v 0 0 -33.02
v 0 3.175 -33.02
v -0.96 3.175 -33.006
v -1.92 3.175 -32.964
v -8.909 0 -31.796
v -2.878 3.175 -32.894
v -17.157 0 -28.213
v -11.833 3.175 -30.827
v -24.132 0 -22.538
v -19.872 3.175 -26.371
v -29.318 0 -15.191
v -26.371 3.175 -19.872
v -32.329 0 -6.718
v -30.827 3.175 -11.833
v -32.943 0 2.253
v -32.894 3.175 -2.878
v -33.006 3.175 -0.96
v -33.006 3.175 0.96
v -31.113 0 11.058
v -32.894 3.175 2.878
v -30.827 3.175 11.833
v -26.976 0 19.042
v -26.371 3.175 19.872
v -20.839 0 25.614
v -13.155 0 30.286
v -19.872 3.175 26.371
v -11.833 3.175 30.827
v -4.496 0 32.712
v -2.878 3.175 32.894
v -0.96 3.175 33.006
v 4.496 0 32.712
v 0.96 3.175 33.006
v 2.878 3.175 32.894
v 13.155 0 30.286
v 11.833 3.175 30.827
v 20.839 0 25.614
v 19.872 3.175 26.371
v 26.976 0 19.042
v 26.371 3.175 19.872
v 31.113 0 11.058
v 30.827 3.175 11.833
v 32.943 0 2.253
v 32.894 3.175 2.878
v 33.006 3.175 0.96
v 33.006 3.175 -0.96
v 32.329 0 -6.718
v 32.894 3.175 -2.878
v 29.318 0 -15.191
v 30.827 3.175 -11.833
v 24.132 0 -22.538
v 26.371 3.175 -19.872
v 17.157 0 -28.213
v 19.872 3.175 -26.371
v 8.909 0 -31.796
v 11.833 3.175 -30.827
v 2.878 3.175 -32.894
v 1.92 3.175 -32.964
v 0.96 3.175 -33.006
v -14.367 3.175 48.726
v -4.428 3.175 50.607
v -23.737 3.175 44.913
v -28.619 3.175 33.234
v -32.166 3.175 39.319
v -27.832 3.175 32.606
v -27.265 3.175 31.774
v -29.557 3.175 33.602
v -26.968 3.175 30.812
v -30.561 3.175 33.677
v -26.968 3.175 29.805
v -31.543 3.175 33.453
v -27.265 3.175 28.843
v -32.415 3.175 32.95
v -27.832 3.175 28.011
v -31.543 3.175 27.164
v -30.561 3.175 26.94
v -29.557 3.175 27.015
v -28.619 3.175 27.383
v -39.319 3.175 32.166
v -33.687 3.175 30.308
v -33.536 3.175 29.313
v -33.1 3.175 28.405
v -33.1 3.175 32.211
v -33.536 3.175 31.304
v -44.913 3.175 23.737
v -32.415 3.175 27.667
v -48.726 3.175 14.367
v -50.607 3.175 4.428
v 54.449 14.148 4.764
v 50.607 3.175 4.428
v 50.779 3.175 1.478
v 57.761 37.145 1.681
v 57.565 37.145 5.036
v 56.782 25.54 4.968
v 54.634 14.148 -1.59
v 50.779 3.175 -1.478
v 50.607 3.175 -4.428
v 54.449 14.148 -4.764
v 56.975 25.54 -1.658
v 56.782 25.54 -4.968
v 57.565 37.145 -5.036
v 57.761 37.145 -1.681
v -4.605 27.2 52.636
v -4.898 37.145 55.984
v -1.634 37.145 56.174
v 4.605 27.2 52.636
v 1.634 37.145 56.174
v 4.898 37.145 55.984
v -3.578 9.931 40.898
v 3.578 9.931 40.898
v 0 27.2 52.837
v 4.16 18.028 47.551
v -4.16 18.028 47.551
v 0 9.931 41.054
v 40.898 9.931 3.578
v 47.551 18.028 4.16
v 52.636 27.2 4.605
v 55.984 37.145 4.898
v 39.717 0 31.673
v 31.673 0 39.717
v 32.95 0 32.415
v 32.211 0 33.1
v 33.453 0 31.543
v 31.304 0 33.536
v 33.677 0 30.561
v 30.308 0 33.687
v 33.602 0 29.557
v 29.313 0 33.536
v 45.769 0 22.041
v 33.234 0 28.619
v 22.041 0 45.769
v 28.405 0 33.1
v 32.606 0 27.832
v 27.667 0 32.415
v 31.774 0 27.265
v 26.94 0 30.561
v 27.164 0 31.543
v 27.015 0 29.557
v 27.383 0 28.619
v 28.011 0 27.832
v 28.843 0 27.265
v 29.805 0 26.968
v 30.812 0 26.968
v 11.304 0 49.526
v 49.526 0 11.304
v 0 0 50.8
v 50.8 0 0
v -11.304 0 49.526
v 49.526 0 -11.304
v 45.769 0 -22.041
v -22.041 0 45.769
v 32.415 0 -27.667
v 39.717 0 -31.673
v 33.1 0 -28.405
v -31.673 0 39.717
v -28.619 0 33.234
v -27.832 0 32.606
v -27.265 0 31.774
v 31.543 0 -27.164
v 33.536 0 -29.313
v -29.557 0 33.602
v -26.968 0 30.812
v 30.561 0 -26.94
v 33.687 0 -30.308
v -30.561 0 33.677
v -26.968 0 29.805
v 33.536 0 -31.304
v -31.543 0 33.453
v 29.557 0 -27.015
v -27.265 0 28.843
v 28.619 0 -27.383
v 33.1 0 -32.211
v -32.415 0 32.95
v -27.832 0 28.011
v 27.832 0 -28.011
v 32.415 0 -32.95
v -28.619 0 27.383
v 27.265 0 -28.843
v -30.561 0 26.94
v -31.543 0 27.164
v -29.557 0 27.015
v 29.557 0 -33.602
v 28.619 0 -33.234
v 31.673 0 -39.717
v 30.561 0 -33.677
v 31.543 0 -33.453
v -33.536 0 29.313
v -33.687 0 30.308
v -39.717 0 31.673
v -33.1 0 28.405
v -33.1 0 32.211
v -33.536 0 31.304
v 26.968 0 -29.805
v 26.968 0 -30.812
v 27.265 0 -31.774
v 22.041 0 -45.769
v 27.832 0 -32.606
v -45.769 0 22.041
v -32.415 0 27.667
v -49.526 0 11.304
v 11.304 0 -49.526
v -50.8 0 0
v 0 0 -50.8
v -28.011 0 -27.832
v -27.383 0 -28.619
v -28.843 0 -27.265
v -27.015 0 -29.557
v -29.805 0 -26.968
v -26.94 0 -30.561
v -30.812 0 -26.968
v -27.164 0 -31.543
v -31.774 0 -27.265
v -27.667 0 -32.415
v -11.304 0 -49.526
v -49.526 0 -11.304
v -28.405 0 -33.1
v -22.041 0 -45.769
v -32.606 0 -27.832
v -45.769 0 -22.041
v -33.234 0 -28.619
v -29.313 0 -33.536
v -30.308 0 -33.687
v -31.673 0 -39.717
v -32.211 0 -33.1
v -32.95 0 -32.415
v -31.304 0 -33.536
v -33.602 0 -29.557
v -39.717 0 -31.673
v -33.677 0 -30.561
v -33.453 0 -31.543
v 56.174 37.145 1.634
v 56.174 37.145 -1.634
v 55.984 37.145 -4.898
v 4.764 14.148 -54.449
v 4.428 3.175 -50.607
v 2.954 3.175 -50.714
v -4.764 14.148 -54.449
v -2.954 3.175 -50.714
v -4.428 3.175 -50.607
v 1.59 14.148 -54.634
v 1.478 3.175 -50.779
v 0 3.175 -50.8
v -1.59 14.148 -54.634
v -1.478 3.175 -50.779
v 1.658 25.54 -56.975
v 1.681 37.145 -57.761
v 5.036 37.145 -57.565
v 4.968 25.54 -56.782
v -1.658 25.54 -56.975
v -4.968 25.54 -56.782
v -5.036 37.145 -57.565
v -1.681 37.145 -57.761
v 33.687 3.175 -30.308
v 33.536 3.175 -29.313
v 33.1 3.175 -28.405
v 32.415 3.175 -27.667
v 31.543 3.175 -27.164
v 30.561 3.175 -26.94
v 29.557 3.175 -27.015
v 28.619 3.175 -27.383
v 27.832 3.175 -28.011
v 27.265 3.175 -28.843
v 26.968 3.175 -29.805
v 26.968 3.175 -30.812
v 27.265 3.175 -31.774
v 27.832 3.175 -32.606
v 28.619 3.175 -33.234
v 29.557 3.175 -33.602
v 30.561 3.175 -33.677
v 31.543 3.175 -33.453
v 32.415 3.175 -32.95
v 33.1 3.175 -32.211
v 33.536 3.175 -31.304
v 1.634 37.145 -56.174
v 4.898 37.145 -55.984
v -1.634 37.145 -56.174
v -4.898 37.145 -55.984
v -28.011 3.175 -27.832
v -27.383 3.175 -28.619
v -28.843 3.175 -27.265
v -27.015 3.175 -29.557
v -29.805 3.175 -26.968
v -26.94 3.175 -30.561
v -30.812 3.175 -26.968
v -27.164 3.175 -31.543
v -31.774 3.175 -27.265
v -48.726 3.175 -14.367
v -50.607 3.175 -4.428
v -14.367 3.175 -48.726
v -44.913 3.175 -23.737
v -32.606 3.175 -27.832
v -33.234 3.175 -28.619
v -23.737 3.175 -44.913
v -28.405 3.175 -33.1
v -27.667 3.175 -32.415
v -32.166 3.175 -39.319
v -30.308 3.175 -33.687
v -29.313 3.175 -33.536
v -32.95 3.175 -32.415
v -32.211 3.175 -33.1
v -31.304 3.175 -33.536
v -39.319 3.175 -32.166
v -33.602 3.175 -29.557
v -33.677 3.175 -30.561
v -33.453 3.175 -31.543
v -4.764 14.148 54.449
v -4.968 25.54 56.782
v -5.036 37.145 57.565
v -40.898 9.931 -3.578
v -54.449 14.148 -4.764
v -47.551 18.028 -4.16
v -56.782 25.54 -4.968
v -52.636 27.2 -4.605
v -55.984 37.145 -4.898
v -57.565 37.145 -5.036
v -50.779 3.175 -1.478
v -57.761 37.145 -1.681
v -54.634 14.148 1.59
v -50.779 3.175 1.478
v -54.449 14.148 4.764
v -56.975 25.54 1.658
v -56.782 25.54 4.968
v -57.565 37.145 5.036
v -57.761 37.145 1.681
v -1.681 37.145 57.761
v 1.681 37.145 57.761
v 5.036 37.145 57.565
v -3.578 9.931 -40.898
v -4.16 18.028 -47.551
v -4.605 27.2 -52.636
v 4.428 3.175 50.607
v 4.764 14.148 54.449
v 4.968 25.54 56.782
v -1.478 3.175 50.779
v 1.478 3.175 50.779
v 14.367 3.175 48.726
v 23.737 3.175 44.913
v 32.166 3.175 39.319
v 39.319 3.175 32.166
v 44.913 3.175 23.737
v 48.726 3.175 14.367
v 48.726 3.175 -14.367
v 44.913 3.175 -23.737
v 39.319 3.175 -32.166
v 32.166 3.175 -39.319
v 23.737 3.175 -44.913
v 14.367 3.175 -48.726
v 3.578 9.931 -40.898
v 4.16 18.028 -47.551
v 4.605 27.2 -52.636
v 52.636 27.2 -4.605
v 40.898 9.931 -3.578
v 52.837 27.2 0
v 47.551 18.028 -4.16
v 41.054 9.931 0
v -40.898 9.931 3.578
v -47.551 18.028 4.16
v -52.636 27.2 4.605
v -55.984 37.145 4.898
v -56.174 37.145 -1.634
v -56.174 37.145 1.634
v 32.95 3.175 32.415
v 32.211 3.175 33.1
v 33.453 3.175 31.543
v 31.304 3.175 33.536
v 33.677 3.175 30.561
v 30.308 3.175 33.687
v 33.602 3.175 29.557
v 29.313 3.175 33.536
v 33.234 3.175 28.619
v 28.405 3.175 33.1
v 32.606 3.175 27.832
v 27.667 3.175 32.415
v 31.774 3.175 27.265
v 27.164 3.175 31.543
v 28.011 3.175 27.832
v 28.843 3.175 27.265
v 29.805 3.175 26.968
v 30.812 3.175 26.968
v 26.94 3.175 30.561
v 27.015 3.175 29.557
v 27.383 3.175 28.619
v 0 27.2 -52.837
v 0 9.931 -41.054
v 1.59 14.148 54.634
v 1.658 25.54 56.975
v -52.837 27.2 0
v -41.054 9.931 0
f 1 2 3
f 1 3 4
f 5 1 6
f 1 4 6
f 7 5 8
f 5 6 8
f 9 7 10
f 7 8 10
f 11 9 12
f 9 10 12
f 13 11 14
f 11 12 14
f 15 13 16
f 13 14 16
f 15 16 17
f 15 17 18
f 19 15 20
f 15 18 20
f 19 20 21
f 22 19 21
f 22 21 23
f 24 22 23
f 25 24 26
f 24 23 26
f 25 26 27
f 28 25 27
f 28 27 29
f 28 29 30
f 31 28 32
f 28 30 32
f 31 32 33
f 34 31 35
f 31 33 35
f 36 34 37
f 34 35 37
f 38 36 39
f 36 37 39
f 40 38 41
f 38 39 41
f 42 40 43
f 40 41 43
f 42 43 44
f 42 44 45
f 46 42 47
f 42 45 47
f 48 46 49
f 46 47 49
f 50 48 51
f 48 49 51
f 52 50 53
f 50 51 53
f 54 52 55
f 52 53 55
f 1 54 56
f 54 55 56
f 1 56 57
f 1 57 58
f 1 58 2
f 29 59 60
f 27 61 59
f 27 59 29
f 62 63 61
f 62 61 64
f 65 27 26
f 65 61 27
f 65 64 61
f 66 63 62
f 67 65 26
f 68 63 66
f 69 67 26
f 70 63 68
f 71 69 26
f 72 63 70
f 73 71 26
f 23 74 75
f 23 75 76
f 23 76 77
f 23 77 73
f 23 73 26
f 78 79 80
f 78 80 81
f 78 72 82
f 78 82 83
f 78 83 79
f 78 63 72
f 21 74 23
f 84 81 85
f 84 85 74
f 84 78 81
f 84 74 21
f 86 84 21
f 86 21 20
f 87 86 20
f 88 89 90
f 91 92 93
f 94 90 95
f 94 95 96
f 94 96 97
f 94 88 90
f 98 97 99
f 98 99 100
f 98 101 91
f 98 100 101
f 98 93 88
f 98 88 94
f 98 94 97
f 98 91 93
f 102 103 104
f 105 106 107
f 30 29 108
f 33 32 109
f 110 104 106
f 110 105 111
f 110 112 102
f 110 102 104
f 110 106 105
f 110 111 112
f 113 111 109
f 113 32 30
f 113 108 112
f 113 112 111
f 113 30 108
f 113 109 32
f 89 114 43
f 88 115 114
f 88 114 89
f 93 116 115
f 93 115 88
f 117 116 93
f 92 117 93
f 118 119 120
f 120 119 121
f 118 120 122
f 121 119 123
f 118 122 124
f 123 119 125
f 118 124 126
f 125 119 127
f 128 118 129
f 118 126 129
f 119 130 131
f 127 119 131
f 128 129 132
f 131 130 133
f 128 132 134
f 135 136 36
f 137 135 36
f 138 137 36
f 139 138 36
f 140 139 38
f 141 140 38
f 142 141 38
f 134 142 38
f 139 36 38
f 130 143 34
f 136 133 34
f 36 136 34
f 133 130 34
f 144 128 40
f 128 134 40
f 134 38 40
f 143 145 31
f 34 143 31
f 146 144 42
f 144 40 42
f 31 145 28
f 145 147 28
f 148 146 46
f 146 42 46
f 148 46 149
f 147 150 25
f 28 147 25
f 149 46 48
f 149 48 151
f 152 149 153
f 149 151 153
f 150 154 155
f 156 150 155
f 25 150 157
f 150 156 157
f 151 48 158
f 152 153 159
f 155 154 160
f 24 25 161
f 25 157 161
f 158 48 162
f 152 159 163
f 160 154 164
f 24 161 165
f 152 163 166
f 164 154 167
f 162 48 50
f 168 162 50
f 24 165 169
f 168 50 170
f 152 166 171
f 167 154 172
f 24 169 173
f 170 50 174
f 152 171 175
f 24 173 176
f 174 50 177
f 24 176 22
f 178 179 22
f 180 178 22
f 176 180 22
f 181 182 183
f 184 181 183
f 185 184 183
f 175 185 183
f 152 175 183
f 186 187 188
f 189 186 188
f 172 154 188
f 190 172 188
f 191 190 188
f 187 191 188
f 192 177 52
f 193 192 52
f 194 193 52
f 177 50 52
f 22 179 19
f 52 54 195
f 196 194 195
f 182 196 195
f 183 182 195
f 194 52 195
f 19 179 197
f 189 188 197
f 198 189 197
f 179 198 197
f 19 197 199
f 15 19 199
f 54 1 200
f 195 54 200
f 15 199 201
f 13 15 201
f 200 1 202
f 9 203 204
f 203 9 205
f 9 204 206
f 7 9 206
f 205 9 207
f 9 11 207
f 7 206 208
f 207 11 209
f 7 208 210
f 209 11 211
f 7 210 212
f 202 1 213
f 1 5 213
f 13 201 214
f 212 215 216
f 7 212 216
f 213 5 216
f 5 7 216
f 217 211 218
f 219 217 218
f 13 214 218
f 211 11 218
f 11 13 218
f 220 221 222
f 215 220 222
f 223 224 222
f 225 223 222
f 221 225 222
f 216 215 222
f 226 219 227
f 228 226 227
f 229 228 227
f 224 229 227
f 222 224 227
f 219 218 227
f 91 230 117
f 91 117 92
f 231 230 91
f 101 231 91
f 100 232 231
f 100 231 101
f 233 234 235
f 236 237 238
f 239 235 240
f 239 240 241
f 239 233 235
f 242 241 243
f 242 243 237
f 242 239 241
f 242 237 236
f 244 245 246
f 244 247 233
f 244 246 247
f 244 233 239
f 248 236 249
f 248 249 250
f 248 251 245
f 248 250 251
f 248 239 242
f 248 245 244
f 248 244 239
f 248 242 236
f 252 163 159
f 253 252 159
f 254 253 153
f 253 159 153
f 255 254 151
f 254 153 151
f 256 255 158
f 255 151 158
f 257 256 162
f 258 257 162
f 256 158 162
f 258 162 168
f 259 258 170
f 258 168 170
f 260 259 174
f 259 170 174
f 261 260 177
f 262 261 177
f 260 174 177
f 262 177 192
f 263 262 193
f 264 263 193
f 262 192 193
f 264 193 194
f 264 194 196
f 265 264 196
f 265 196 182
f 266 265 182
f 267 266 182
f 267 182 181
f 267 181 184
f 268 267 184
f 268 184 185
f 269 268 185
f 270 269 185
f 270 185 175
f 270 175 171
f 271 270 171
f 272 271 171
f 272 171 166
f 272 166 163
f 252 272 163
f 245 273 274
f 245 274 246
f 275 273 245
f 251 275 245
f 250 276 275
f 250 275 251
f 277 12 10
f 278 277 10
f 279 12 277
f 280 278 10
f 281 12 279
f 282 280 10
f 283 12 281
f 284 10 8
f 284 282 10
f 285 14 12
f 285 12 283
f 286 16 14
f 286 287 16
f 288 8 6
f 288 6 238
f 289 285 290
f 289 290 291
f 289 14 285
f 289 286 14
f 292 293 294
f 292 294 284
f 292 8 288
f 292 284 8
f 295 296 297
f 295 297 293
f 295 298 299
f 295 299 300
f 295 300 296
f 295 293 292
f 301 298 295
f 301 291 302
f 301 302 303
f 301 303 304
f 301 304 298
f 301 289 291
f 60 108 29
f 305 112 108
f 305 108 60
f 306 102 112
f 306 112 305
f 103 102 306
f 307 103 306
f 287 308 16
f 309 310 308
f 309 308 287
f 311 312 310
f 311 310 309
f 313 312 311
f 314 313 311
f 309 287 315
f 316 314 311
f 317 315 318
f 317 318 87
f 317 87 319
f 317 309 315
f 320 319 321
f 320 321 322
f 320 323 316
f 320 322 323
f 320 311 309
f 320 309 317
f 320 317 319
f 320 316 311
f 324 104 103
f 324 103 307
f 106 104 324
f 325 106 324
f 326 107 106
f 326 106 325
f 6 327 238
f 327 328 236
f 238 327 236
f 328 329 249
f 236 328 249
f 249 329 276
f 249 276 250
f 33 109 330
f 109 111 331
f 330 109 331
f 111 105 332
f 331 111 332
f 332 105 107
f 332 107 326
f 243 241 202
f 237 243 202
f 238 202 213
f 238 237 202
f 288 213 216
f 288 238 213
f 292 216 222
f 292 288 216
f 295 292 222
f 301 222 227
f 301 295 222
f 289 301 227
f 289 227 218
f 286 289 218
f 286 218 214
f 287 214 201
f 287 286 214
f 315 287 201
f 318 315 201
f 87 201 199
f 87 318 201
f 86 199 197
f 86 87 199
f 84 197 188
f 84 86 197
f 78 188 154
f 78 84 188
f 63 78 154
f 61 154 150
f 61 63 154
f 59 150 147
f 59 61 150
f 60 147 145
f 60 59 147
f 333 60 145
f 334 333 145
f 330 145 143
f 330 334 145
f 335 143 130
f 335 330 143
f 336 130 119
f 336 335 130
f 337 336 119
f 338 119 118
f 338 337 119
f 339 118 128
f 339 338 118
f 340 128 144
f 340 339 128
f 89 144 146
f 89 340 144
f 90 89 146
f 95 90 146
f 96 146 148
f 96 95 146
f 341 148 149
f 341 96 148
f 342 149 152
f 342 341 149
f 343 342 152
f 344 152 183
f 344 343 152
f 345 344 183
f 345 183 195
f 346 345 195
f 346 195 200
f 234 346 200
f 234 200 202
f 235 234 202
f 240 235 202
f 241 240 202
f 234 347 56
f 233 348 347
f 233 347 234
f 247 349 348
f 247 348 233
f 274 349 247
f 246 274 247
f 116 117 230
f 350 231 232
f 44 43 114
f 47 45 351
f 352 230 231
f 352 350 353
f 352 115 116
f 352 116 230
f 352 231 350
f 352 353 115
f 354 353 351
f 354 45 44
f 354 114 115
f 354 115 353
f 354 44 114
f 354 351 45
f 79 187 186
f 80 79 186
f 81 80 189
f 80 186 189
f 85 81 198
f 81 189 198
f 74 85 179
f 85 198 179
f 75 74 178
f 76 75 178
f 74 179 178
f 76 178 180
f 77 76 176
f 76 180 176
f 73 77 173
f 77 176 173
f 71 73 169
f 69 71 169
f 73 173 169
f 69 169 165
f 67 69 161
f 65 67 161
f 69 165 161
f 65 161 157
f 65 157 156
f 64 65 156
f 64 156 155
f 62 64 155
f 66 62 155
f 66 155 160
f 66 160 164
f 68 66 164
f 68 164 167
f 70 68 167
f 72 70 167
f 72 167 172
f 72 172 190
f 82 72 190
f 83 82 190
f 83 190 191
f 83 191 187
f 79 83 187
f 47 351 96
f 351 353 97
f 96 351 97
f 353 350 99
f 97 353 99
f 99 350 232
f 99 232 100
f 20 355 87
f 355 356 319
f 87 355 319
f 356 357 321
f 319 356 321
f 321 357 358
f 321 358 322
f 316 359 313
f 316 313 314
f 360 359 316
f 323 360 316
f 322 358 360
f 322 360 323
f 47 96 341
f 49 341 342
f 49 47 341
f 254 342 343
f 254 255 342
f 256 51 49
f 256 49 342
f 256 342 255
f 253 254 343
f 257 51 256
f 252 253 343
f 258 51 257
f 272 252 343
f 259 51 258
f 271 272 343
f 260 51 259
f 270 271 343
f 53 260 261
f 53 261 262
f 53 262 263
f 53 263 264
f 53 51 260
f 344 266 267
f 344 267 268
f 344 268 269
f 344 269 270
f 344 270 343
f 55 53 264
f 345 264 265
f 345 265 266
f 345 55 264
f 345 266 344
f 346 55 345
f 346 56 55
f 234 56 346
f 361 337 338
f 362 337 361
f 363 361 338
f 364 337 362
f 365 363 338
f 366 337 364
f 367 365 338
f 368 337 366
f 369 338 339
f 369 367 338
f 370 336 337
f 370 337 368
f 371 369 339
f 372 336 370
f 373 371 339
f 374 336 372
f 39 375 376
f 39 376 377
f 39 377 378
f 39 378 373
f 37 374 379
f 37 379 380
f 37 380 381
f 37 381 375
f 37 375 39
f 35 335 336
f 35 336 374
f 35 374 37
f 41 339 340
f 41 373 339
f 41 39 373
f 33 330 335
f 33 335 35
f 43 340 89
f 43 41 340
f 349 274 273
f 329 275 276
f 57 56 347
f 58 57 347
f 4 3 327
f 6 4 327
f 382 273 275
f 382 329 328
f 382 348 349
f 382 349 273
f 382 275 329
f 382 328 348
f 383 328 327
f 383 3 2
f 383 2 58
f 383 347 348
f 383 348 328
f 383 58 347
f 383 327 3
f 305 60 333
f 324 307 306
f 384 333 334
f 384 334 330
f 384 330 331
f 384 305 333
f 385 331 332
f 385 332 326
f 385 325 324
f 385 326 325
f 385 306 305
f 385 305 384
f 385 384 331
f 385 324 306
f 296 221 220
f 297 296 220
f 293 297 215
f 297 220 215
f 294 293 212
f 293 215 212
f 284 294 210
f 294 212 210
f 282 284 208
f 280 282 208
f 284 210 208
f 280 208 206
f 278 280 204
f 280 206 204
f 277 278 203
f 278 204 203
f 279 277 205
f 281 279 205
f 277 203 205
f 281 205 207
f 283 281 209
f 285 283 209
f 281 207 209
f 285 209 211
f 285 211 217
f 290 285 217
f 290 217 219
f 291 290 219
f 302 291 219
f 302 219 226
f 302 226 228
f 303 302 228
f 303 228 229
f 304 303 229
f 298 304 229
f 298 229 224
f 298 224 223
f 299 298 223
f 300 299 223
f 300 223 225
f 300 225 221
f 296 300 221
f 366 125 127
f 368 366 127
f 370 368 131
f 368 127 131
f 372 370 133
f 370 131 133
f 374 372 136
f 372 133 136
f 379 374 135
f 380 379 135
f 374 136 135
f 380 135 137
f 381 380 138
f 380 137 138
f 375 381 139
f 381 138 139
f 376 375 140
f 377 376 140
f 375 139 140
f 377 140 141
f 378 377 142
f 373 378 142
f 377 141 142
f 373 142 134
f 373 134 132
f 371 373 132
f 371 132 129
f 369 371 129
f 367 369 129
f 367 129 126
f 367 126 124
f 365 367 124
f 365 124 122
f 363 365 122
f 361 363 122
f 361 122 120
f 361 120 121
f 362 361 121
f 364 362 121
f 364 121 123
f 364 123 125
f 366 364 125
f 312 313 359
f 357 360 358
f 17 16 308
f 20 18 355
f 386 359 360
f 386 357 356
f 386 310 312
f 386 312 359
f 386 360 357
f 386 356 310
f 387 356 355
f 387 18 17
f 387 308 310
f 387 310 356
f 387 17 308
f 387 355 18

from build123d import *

# Parameters (mm, degrees)
SKETCH3_W               = 17.78
SKETCH3_H               = 3.175
REVOLVE2_ANGLE          = 10
CIRPATTERN1_COUNT       = 4
F_1_4_CLEARANCE_HOLE1_D = 6.7564
CIRPATTERN2_COUNT       = 4


# Read off the part's stored shape, not the designer's step: Revolve2
with BuildPart() as part:
    # Sketch3 → Revolve1 (revolve)
    with BuildSketch(Plane.XY, mode=Mode.PRIVATE) as revolve1_sk:
        with Locations((-41.91, 1.5875)):
            Rectangle(SKETCH3_W, SKETCH3_H)
    revolve(revolve1_sk.sketch.rotate(Axis((0, -0.15875, 0), (0, 1, 0)), 270), axis=Axis((0, -0.15875, 0), (0, 1, 0)))

    # Revolve2 outline → Revolve2 (revolve)
    with BuildSketch(Plane(origin=(0, 0, 0), x_dir=(-0.9961946980917455, 0, -0.0871557427476582), z_dir=(0.0871557427476582, 0, -0.9961946980917455))):
        with BuildLine():
            Line((33.02, 3.175), (50.8, 3.175))
            ThreePointArc((50.8, 3.175), (56.020671736, 19.804496878), (57.785, 37.144702343))
            Line((57.785, 37.144702343), (56.1975, 37.144702343))
            ThreePointArc((56.1975, 37.144702343), (47.732858136, 18.028274757), (33.02, 3.175))
        make_face()
    revolve2 = revolve(axis=Axis((0, 0, 0), (0, 1, 0)), revolution_arc=REVOLVE2_ANGLE)

    # CirPattern1: Revolve2 ×4 about axis
    cirpattern1_axis = Axis((0, -0.15875, 0), (0, 1, 0))
    for i in range(1, CIRPATTERN1_COUNT):
        add(revolve2.rotate(cirpattern1_axis, i * 360 / CIRPATTERN1_COUNT))

    # 1/4 Clearance Hole1 (through all)
    with Locations(Plane(origin=(0, 3.175, 0), x_dir=(1, 0, 0), z_dir=(0, 1, 0))):
        with Locations((-30.308364409, -30.308364409)):
            f_1_4_clearance_hole1 = Hole(F_1_4_CLEARANCE_HOLE1_D / 2)

    # CirPattern2: 1/4 Clearance Hole1 ×4 about axis
    cirpattern2_axis = Axis((0, 0, 0), (0, 1, 0))
    for i in range(1, CIRPATTERN2_COUNT):
        add(f_1_4_clearance_hole1.rotate(cirpattern2_axis, i * 360 / CIRPATTERN2_COUNT), mode=Mode.SUBTRACT)


solid = part.part
